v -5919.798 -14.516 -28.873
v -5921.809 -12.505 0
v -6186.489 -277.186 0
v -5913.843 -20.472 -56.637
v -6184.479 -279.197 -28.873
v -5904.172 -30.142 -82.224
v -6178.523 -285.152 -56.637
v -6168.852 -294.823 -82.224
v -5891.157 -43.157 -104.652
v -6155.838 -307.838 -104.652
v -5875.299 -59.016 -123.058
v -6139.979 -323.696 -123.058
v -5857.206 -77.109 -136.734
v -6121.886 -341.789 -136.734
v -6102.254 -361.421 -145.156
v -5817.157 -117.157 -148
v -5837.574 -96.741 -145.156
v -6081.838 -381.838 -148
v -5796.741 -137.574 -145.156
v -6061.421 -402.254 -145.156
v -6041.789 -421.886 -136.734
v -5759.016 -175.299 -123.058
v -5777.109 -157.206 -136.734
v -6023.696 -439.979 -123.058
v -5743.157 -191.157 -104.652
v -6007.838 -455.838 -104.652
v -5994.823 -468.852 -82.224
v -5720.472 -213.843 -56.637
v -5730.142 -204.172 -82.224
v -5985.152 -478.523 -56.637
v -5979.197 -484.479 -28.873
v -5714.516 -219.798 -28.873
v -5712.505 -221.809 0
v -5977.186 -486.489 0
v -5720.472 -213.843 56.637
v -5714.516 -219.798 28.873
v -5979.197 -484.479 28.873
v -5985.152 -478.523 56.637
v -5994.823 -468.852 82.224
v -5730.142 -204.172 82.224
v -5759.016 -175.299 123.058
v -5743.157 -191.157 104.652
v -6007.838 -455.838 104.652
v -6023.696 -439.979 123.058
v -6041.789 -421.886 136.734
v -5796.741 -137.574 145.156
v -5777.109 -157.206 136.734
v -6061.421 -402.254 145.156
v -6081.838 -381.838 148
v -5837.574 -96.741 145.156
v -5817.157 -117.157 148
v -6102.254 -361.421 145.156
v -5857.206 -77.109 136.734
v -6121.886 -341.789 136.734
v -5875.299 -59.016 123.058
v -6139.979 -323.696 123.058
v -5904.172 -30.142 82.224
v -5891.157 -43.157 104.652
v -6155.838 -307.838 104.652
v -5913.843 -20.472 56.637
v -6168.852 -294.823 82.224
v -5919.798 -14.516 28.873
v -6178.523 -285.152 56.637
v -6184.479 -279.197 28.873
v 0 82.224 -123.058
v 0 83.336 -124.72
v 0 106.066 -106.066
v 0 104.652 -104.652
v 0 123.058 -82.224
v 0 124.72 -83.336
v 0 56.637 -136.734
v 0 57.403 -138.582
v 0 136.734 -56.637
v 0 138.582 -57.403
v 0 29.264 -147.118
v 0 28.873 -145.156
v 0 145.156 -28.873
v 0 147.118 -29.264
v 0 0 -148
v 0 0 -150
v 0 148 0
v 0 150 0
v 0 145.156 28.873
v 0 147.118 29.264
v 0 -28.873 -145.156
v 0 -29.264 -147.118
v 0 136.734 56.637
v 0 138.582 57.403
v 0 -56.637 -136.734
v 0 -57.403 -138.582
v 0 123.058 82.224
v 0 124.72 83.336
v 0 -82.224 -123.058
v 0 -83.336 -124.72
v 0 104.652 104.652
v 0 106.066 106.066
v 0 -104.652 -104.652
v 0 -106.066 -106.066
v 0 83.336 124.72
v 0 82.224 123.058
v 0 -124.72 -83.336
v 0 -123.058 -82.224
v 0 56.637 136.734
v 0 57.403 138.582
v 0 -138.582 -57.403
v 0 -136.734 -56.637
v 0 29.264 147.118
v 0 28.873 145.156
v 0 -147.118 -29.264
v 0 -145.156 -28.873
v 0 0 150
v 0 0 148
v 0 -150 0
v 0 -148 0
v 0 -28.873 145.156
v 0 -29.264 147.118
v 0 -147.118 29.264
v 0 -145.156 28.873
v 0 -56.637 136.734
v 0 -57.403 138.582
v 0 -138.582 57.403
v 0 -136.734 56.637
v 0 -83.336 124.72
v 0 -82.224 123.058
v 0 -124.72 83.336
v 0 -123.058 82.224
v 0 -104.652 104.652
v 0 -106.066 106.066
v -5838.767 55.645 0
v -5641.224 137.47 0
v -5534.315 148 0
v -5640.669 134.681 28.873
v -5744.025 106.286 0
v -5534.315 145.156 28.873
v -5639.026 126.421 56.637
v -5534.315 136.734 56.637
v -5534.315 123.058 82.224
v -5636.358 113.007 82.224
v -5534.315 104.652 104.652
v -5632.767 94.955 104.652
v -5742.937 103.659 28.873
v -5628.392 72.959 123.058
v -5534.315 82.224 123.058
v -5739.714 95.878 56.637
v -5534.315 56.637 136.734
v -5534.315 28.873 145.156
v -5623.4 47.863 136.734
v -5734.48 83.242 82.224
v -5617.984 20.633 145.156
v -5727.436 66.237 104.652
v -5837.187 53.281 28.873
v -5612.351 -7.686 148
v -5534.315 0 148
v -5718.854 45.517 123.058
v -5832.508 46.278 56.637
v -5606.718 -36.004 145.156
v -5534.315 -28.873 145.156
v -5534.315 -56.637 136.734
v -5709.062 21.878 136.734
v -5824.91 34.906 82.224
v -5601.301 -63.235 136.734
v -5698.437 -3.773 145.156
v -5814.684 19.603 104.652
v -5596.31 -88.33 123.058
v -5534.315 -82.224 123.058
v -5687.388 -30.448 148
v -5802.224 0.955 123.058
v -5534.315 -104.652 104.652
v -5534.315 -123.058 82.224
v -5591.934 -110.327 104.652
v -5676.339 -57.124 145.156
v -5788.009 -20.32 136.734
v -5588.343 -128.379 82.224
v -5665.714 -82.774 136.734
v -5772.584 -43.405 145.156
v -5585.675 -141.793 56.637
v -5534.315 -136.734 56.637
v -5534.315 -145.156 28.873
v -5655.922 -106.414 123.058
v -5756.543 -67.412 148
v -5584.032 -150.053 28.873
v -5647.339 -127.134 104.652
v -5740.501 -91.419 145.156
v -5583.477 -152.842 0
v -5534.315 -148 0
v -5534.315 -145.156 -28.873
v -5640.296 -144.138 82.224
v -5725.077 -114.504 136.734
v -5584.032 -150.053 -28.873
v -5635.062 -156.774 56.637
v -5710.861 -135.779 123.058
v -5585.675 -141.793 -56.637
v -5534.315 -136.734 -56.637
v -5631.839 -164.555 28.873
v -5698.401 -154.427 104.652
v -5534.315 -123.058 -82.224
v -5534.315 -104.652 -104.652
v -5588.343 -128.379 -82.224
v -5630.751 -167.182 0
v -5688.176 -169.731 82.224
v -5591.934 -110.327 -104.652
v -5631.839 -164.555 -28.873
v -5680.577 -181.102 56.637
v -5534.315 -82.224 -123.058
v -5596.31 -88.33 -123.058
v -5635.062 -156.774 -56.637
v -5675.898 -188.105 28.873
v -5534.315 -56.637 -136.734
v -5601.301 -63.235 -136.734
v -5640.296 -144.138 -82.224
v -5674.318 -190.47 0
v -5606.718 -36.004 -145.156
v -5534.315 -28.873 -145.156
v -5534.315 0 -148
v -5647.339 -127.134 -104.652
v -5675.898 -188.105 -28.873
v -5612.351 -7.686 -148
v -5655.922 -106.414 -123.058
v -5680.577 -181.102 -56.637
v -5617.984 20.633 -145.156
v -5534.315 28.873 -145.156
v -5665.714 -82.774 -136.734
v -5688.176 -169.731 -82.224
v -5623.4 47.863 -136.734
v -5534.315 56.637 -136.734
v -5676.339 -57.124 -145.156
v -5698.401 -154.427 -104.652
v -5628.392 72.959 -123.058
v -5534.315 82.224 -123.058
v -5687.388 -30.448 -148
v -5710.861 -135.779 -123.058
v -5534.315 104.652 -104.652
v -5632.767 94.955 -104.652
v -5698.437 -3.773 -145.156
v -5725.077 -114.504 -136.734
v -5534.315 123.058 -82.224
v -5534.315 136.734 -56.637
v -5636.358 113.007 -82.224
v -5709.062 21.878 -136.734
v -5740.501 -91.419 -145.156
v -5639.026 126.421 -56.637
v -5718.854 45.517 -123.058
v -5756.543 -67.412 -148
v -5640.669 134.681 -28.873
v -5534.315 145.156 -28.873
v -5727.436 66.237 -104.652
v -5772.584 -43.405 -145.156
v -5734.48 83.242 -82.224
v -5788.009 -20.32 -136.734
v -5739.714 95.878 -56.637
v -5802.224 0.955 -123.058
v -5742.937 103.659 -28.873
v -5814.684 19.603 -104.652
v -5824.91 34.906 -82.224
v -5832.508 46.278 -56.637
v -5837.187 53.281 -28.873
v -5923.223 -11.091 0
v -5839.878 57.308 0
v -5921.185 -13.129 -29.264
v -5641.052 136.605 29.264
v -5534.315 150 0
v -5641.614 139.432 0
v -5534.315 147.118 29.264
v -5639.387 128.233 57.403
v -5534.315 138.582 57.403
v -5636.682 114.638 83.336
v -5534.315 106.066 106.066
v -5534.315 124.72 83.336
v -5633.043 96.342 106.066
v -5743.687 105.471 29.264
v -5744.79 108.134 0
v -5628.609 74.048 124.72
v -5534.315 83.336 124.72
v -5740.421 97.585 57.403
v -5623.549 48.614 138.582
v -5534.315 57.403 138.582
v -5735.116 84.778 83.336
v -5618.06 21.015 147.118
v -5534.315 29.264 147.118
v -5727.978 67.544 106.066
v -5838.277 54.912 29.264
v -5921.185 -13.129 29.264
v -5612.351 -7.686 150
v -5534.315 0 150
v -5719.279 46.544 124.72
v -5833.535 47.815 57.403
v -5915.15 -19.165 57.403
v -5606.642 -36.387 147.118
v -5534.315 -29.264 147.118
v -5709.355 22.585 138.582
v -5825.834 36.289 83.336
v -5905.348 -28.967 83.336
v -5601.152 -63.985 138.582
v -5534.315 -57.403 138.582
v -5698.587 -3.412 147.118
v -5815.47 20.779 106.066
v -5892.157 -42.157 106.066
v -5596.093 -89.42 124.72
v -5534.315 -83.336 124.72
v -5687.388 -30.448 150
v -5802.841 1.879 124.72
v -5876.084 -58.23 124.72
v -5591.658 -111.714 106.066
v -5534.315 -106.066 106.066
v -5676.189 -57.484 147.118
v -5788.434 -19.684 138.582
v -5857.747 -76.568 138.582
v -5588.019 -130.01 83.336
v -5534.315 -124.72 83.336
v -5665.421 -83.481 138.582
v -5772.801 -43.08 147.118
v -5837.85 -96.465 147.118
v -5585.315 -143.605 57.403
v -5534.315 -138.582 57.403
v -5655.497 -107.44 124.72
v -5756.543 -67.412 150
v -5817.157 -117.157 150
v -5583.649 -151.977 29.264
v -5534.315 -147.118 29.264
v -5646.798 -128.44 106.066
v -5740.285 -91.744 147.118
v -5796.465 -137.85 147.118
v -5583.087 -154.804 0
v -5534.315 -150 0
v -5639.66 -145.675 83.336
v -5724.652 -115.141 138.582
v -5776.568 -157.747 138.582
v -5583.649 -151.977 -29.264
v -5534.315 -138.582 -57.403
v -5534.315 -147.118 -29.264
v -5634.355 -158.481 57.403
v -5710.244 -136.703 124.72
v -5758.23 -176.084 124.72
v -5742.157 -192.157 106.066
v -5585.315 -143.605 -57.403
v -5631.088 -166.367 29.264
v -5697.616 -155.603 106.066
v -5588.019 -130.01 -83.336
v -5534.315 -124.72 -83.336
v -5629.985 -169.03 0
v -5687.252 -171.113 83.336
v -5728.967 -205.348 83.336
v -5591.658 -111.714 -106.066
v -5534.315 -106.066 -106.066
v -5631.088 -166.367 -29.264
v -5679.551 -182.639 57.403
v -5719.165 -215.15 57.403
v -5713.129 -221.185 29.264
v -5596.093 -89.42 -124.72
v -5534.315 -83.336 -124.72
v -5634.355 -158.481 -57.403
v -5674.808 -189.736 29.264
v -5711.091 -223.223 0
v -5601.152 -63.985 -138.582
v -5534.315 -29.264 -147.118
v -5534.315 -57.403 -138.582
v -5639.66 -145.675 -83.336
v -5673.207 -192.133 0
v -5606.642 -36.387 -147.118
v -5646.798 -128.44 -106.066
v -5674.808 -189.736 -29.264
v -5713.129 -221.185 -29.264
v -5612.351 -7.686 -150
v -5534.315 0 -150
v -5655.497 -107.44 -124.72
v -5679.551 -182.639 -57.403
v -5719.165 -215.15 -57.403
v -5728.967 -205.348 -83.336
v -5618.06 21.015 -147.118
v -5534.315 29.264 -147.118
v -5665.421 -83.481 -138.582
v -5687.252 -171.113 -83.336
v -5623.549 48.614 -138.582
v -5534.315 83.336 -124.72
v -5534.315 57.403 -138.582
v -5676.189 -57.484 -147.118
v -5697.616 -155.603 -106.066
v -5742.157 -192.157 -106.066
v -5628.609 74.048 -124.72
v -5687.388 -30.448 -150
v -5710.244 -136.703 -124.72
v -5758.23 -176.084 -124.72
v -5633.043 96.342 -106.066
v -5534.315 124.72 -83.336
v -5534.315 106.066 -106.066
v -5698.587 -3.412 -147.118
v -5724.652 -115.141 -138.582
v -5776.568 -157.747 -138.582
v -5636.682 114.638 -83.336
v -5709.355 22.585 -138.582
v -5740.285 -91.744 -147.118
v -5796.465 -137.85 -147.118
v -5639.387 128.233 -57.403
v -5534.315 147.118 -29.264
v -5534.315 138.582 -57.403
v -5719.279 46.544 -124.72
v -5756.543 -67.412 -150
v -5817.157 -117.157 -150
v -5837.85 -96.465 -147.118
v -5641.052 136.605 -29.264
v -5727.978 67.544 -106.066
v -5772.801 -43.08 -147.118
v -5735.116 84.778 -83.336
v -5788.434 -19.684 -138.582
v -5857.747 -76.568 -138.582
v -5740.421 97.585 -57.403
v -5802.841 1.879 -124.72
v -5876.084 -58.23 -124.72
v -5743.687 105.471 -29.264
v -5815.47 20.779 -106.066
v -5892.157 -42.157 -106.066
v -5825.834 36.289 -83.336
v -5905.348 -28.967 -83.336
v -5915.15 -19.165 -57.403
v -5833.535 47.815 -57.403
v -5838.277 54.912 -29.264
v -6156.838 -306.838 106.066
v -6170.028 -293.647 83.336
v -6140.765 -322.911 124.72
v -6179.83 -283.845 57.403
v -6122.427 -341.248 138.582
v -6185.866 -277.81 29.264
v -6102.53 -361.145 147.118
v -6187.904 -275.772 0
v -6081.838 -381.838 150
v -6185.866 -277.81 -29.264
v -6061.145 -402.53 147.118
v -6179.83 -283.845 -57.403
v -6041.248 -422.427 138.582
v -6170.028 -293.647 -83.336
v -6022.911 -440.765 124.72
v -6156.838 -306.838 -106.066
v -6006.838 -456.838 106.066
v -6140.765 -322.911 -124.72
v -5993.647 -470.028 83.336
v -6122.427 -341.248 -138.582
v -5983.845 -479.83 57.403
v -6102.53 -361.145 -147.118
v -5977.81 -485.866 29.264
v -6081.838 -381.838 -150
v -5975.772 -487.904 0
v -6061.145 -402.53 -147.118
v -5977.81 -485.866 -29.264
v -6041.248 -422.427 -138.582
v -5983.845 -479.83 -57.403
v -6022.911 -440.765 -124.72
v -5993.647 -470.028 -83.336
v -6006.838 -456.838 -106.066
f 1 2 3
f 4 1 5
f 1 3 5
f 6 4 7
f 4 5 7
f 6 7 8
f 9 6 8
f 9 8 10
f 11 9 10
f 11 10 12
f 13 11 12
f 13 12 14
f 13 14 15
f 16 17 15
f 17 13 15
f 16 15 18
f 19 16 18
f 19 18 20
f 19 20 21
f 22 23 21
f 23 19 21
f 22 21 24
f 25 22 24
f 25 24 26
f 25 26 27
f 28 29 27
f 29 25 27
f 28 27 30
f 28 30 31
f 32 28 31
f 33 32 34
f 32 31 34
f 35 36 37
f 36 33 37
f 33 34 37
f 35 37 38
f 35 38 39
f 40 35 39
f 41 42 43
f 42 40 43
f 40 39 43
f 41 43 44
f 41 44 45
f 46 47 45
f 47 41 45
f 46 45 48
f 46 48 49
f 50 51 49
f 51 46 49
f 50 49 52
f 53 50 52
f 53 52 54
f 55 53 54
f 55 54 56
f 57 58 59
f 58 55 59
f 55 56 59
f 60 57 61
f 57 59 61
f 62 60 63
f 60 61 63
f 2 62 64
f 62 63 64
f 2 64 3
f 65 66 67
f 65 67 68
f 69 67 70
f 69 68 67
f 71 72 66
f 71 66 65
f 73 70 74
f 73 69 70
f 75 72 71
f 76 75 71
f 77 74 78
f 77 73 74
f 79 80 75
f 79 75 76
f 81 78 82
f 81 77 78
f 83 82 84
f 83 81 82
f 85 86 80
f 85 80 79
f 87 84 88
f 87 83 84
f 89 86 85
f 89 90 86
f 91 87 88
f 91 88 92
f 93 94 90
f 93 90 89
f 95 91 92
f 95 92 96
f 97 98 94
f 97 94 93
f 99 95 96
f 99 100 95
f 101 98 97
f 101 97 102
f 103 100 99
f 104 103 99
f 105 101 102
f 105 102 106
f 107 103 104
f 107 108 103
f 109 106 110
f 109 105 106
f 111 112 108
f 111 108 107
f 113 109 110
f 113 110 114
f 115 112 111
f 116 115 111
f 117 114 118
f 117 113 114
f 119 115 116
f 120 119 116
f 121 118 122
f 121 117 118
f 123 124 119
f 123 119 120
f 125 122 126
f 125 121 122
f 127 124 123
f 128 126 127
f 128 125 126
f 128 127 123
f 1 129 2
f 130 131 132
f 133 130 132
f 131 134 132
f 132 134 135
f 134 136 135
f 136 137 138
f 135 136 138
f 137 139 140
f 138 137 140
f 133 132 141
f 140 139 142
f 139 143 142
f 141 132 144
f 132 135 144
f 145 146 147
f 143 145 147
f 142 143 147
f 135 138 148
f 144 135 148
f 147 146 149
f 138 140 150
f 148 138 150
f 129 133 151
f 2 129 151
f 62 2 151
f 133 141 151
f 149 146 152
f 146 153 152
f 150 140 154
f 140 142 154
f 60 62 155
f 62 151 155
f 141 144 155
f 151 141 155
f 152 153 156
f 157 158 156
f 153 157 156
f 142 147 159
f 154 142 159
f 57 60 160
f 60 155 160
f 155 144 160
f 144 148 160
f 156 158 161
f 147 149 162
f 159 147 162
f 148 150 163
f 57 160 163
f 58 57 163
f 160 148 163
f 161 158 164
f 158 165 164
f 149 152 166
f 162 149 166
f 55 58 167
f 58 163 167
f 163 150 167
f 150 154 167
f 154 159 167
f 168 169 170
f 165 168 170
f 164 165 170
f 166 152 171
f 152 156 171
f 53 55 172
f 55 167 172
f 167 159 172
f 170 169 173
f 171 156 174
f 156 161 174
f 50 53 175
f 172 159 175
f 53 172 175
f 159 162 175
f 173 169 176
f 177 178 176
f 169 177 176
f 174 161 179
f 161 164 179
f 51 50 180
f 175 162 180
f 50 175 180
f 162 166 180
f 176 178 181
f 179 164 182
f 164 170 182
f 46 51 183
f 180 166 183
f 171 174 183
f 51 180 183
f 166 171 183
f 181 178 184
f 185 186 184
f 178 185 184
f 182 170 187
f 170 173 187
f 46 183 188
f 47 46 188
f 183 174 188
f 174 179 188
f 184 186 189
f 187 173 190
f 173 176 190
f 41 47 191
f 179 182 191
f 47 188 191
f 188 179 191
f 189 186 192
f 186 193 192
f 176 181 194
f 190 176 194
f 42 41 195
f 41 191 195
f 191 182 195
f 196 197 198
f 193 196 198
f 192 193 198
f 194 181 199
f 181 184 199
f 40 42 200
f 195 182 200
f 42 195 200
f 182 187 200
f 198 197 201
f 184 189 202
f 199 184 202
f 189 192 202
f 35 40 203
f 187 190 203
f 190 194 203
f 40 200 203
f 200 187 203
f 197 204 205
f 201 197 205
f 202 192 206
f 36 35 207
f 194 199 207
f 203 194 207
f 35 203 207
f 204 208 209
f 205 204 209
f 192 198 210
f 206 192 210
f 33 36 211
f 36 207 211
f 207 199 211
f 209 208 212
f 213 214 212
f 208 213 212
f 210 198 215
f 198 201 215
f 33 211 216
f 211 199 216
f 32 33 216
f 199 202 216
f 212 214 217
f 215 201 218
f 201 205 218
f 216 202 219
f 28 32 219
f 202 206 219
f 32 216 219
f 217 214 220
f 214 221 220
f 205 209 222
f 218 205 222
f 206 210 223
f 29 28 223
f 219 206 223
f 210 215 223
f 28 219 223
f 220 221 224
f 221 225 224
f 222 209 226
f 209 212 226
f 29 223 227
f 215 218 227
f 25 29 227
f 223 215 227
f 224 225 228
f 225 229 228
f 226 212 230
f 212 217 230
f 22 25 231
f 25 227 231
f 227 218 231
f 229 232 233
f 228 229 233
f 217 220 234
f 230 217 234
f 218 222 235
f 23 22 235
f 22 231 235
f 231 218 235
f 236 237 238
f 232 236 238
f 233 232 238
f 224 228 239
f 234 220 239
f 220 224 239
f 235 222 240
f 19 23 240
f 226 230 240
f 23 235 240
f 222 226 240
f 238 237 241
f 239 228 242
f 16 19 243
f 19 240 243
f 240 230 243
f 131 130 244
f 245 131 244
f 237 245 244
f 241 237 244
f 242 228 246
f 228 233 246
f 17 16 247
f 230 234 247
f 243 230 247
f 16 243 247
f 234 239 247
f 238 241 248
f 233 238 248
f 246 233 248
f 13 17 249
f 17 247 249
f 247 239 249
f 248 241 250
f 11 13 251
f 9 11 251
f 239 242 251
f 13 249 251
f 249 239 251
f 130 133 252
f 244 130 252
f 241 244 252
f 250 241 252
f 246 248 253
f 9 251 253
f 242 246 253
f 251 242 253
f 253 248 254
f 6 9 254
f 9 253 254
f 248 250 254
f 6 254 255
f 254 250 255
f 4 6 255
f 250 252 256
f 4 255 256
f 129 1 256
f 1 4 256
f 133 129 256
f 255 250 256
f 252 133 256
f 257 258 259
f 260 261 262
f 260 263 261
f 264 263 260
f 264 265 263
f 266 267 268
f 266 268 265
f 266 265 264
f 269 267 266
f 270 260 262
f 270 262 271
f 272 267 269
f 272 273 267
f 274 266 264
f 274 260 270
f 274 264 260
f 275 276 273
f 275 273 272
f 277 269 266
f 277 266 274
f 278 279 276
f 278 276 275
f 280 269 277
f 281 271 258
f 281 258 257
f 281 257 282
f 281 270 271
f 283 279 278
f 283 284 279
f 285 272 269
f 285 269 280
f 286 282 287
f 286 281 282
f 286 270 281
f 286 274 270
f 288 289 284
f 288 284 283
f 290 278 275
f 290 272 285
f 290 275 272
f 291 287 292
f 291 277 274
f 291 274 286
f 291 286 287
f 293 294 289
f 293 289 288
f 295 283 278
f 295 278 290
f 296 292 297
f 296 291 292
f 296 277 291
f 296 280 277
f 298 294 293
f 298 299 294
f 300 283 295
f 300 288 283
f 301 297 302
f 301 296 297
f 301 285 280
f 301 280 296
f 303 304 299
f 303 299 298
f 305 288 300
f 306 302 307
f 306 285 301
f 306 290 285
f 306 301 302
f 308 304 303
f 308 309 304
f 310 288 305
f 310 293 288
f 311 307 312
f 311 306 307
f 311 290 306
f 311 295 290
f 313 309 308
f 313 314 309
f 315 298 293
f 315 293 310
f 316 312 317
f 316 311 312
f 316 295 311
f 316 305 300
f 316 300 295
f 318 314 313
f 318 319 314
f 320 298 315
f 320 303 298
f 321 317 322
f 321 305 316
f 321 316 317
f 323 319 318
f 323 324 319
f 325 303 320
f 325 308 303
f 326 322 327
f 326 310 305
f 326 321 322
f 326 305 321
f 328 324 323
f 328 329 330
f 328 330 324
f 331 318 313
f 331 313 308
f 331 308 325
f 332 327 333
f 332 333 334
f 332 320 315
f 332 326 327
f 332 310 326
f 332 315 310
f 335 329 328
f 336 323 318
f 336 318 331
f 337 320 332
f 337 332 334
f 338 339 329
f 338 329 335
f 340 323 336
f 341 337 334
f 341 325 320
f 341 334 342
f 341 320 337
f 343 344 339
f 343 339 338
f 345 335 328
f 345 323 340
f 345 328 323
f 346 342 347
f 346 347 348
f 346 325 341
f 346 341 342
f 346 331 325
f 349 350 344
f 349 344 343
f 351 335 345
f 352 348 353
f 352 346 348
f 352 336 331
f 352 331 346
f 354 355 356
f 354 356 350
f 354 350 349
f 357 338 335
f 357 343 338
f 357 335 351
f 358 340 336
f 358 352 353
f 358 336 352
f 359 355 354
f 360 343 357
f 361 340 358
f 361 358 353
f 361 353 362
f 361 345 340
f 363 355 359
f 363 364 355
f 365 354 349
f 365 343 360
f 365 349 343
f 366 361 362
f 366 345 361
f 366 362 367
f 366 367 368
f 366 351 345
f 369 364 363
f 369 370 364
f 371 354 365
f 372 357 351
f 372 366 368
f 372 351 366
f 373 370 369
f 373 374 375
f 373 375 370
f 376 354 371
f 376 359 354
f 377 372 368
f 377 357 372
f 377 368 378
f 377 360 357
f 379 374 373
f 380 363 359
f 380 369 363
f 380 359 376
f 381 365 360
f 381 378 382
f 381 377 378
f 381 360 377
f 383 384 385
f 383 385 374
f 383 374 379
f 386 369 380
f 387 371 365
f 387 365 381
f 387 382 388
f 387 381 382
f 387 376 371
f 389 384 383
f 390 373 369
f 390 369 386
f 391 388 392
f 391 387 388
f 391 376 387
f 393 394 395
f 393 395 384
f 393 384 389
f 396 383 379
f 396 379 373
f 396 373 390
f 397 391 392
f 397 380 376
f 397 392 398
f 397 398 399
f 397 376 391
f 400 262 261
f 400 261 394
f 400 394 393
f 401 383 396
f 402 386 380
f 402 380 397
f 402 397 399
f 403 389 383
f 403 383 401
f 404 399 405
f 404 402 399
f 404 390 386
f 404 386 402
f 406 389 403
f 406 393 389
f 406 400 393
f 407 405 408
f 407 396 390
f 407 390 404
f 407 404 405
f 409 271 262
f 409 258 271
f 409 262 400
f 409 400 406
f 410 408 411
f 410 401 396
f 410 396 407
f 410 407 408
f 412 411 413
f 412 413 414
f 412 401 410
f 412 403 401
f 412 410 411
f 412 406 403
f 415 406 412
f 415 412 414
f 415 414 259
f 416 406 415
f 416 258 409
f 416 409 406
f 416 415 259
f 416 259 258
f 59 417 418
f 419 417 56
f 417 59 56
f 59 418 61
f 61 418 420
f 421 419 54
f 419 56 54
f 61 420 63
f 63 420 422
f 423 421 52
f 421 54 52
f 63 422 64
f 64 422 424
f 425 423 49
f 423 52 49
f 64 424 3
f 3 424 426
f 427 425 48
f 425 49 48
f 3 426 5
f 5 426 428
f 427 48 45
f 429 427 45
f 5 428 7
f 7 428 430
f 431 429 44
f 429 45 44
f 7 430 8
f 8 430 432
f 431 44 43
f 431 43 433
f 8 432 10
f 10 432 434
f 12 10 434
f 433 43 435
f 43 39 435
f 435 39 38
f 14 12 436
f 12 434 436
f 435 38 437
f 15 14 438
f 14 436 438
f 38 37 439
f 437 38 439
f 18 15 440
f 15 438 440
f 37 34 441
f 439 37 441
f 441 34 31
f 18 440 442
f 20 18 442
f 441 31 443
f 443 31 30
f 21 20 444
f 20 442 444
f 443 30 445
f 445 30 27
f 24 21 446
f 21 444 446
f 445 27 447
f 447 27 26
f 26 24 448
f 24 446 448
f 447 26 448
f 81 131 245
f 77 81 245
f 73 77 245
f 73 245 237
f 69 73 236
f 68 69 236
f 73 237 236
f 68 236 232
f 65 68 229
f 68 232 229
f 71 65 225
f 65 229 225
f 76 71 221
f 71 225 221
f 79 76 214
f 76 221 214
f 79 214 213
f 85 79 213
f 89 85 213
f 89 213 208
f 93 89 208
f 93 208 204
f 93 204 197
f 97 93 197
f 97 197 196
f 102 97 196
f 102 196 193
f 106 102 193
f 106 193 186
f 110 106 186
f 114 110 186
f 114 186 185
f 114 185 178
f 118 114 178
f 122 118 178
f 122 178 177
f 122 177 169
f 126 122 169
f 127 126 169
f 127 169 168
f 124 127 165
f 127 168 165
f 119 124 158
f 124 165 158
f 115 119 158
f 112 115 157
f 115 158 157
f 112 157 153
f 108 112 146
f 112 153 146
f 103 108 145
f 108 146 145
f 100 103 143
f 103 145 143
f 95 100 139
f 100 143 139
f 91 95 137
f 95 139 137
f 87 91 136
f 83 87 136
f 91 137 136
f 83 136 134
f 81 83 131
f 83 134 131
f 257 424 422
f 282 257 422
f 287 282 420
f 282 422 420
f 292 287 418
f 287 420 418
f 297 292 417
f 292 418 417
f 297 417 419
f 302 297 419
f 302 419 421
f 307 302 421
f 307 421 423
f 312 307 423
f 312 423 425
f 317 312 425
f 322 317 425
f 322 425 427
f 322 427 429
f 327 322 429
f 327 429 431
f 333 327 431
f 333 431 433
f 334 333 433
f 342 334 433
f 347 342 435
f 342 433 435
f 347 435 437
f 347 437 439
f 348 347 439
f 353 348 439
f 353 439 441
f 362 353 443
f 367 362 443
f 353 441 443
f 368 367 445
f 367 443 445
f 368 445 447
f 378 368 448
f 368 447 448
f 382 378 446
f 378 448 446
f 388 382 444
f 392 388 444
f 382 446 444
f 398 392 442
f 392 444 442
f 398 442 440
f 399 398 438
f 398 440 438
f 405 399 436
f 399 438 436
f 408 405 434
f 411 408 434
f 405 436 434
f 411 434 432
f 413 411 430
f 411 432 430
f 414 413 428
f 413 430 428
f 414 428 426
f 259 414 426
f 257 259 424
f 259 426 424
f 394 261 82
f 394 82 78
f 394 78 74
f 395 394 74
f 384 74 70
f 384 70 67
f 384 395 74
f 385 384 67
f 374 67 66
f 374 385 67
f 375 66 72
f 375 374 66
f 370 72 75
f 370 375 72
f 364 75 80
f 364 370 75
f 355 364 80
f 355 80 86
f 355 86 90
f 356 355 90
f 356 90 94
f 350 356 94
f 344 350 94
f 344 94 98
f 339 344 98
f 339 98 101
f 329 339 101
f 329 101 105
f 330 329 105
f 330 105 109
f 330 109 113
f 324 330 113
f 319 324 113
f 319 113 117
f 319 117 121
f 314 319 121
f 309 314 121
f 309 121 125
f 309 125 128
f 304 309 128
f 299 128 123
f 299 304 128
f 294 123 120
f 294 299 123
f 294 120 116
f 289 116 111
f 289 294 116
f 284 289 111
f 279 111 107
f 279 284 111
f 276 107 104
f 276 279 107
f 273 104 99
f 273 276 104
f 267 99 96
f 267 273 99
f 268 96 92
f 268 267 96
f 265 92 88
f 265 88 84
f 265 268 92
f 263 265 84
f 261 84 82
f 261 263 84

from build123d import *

# Parameters (mm, degrees)
F0_R   = 150
F0_R_2 = 148


with BuildPart() as f2:
    # F2: sweep along a path in F1
    with BuildLine(Plane.XY) as f2_path:
        Line((0, 0), (-5534.314575, 0))
        ThreePointArc((-5534.314575, 0), (-5687.387948, -30.448187), (-5817.157288, -117.157288))
        Line((-5817.157288, -117.157288), (-6081.837662, -381.837662))
    # F0 (on Right) → F2 (sweep)
    with BuildSketch(Plane.YZ):
        Circle(F0_R)
        Circle(F0_R_2, mode=Mode.SUBTRACT)
    sweep(path=f2_path.line)


solid = f2.part
